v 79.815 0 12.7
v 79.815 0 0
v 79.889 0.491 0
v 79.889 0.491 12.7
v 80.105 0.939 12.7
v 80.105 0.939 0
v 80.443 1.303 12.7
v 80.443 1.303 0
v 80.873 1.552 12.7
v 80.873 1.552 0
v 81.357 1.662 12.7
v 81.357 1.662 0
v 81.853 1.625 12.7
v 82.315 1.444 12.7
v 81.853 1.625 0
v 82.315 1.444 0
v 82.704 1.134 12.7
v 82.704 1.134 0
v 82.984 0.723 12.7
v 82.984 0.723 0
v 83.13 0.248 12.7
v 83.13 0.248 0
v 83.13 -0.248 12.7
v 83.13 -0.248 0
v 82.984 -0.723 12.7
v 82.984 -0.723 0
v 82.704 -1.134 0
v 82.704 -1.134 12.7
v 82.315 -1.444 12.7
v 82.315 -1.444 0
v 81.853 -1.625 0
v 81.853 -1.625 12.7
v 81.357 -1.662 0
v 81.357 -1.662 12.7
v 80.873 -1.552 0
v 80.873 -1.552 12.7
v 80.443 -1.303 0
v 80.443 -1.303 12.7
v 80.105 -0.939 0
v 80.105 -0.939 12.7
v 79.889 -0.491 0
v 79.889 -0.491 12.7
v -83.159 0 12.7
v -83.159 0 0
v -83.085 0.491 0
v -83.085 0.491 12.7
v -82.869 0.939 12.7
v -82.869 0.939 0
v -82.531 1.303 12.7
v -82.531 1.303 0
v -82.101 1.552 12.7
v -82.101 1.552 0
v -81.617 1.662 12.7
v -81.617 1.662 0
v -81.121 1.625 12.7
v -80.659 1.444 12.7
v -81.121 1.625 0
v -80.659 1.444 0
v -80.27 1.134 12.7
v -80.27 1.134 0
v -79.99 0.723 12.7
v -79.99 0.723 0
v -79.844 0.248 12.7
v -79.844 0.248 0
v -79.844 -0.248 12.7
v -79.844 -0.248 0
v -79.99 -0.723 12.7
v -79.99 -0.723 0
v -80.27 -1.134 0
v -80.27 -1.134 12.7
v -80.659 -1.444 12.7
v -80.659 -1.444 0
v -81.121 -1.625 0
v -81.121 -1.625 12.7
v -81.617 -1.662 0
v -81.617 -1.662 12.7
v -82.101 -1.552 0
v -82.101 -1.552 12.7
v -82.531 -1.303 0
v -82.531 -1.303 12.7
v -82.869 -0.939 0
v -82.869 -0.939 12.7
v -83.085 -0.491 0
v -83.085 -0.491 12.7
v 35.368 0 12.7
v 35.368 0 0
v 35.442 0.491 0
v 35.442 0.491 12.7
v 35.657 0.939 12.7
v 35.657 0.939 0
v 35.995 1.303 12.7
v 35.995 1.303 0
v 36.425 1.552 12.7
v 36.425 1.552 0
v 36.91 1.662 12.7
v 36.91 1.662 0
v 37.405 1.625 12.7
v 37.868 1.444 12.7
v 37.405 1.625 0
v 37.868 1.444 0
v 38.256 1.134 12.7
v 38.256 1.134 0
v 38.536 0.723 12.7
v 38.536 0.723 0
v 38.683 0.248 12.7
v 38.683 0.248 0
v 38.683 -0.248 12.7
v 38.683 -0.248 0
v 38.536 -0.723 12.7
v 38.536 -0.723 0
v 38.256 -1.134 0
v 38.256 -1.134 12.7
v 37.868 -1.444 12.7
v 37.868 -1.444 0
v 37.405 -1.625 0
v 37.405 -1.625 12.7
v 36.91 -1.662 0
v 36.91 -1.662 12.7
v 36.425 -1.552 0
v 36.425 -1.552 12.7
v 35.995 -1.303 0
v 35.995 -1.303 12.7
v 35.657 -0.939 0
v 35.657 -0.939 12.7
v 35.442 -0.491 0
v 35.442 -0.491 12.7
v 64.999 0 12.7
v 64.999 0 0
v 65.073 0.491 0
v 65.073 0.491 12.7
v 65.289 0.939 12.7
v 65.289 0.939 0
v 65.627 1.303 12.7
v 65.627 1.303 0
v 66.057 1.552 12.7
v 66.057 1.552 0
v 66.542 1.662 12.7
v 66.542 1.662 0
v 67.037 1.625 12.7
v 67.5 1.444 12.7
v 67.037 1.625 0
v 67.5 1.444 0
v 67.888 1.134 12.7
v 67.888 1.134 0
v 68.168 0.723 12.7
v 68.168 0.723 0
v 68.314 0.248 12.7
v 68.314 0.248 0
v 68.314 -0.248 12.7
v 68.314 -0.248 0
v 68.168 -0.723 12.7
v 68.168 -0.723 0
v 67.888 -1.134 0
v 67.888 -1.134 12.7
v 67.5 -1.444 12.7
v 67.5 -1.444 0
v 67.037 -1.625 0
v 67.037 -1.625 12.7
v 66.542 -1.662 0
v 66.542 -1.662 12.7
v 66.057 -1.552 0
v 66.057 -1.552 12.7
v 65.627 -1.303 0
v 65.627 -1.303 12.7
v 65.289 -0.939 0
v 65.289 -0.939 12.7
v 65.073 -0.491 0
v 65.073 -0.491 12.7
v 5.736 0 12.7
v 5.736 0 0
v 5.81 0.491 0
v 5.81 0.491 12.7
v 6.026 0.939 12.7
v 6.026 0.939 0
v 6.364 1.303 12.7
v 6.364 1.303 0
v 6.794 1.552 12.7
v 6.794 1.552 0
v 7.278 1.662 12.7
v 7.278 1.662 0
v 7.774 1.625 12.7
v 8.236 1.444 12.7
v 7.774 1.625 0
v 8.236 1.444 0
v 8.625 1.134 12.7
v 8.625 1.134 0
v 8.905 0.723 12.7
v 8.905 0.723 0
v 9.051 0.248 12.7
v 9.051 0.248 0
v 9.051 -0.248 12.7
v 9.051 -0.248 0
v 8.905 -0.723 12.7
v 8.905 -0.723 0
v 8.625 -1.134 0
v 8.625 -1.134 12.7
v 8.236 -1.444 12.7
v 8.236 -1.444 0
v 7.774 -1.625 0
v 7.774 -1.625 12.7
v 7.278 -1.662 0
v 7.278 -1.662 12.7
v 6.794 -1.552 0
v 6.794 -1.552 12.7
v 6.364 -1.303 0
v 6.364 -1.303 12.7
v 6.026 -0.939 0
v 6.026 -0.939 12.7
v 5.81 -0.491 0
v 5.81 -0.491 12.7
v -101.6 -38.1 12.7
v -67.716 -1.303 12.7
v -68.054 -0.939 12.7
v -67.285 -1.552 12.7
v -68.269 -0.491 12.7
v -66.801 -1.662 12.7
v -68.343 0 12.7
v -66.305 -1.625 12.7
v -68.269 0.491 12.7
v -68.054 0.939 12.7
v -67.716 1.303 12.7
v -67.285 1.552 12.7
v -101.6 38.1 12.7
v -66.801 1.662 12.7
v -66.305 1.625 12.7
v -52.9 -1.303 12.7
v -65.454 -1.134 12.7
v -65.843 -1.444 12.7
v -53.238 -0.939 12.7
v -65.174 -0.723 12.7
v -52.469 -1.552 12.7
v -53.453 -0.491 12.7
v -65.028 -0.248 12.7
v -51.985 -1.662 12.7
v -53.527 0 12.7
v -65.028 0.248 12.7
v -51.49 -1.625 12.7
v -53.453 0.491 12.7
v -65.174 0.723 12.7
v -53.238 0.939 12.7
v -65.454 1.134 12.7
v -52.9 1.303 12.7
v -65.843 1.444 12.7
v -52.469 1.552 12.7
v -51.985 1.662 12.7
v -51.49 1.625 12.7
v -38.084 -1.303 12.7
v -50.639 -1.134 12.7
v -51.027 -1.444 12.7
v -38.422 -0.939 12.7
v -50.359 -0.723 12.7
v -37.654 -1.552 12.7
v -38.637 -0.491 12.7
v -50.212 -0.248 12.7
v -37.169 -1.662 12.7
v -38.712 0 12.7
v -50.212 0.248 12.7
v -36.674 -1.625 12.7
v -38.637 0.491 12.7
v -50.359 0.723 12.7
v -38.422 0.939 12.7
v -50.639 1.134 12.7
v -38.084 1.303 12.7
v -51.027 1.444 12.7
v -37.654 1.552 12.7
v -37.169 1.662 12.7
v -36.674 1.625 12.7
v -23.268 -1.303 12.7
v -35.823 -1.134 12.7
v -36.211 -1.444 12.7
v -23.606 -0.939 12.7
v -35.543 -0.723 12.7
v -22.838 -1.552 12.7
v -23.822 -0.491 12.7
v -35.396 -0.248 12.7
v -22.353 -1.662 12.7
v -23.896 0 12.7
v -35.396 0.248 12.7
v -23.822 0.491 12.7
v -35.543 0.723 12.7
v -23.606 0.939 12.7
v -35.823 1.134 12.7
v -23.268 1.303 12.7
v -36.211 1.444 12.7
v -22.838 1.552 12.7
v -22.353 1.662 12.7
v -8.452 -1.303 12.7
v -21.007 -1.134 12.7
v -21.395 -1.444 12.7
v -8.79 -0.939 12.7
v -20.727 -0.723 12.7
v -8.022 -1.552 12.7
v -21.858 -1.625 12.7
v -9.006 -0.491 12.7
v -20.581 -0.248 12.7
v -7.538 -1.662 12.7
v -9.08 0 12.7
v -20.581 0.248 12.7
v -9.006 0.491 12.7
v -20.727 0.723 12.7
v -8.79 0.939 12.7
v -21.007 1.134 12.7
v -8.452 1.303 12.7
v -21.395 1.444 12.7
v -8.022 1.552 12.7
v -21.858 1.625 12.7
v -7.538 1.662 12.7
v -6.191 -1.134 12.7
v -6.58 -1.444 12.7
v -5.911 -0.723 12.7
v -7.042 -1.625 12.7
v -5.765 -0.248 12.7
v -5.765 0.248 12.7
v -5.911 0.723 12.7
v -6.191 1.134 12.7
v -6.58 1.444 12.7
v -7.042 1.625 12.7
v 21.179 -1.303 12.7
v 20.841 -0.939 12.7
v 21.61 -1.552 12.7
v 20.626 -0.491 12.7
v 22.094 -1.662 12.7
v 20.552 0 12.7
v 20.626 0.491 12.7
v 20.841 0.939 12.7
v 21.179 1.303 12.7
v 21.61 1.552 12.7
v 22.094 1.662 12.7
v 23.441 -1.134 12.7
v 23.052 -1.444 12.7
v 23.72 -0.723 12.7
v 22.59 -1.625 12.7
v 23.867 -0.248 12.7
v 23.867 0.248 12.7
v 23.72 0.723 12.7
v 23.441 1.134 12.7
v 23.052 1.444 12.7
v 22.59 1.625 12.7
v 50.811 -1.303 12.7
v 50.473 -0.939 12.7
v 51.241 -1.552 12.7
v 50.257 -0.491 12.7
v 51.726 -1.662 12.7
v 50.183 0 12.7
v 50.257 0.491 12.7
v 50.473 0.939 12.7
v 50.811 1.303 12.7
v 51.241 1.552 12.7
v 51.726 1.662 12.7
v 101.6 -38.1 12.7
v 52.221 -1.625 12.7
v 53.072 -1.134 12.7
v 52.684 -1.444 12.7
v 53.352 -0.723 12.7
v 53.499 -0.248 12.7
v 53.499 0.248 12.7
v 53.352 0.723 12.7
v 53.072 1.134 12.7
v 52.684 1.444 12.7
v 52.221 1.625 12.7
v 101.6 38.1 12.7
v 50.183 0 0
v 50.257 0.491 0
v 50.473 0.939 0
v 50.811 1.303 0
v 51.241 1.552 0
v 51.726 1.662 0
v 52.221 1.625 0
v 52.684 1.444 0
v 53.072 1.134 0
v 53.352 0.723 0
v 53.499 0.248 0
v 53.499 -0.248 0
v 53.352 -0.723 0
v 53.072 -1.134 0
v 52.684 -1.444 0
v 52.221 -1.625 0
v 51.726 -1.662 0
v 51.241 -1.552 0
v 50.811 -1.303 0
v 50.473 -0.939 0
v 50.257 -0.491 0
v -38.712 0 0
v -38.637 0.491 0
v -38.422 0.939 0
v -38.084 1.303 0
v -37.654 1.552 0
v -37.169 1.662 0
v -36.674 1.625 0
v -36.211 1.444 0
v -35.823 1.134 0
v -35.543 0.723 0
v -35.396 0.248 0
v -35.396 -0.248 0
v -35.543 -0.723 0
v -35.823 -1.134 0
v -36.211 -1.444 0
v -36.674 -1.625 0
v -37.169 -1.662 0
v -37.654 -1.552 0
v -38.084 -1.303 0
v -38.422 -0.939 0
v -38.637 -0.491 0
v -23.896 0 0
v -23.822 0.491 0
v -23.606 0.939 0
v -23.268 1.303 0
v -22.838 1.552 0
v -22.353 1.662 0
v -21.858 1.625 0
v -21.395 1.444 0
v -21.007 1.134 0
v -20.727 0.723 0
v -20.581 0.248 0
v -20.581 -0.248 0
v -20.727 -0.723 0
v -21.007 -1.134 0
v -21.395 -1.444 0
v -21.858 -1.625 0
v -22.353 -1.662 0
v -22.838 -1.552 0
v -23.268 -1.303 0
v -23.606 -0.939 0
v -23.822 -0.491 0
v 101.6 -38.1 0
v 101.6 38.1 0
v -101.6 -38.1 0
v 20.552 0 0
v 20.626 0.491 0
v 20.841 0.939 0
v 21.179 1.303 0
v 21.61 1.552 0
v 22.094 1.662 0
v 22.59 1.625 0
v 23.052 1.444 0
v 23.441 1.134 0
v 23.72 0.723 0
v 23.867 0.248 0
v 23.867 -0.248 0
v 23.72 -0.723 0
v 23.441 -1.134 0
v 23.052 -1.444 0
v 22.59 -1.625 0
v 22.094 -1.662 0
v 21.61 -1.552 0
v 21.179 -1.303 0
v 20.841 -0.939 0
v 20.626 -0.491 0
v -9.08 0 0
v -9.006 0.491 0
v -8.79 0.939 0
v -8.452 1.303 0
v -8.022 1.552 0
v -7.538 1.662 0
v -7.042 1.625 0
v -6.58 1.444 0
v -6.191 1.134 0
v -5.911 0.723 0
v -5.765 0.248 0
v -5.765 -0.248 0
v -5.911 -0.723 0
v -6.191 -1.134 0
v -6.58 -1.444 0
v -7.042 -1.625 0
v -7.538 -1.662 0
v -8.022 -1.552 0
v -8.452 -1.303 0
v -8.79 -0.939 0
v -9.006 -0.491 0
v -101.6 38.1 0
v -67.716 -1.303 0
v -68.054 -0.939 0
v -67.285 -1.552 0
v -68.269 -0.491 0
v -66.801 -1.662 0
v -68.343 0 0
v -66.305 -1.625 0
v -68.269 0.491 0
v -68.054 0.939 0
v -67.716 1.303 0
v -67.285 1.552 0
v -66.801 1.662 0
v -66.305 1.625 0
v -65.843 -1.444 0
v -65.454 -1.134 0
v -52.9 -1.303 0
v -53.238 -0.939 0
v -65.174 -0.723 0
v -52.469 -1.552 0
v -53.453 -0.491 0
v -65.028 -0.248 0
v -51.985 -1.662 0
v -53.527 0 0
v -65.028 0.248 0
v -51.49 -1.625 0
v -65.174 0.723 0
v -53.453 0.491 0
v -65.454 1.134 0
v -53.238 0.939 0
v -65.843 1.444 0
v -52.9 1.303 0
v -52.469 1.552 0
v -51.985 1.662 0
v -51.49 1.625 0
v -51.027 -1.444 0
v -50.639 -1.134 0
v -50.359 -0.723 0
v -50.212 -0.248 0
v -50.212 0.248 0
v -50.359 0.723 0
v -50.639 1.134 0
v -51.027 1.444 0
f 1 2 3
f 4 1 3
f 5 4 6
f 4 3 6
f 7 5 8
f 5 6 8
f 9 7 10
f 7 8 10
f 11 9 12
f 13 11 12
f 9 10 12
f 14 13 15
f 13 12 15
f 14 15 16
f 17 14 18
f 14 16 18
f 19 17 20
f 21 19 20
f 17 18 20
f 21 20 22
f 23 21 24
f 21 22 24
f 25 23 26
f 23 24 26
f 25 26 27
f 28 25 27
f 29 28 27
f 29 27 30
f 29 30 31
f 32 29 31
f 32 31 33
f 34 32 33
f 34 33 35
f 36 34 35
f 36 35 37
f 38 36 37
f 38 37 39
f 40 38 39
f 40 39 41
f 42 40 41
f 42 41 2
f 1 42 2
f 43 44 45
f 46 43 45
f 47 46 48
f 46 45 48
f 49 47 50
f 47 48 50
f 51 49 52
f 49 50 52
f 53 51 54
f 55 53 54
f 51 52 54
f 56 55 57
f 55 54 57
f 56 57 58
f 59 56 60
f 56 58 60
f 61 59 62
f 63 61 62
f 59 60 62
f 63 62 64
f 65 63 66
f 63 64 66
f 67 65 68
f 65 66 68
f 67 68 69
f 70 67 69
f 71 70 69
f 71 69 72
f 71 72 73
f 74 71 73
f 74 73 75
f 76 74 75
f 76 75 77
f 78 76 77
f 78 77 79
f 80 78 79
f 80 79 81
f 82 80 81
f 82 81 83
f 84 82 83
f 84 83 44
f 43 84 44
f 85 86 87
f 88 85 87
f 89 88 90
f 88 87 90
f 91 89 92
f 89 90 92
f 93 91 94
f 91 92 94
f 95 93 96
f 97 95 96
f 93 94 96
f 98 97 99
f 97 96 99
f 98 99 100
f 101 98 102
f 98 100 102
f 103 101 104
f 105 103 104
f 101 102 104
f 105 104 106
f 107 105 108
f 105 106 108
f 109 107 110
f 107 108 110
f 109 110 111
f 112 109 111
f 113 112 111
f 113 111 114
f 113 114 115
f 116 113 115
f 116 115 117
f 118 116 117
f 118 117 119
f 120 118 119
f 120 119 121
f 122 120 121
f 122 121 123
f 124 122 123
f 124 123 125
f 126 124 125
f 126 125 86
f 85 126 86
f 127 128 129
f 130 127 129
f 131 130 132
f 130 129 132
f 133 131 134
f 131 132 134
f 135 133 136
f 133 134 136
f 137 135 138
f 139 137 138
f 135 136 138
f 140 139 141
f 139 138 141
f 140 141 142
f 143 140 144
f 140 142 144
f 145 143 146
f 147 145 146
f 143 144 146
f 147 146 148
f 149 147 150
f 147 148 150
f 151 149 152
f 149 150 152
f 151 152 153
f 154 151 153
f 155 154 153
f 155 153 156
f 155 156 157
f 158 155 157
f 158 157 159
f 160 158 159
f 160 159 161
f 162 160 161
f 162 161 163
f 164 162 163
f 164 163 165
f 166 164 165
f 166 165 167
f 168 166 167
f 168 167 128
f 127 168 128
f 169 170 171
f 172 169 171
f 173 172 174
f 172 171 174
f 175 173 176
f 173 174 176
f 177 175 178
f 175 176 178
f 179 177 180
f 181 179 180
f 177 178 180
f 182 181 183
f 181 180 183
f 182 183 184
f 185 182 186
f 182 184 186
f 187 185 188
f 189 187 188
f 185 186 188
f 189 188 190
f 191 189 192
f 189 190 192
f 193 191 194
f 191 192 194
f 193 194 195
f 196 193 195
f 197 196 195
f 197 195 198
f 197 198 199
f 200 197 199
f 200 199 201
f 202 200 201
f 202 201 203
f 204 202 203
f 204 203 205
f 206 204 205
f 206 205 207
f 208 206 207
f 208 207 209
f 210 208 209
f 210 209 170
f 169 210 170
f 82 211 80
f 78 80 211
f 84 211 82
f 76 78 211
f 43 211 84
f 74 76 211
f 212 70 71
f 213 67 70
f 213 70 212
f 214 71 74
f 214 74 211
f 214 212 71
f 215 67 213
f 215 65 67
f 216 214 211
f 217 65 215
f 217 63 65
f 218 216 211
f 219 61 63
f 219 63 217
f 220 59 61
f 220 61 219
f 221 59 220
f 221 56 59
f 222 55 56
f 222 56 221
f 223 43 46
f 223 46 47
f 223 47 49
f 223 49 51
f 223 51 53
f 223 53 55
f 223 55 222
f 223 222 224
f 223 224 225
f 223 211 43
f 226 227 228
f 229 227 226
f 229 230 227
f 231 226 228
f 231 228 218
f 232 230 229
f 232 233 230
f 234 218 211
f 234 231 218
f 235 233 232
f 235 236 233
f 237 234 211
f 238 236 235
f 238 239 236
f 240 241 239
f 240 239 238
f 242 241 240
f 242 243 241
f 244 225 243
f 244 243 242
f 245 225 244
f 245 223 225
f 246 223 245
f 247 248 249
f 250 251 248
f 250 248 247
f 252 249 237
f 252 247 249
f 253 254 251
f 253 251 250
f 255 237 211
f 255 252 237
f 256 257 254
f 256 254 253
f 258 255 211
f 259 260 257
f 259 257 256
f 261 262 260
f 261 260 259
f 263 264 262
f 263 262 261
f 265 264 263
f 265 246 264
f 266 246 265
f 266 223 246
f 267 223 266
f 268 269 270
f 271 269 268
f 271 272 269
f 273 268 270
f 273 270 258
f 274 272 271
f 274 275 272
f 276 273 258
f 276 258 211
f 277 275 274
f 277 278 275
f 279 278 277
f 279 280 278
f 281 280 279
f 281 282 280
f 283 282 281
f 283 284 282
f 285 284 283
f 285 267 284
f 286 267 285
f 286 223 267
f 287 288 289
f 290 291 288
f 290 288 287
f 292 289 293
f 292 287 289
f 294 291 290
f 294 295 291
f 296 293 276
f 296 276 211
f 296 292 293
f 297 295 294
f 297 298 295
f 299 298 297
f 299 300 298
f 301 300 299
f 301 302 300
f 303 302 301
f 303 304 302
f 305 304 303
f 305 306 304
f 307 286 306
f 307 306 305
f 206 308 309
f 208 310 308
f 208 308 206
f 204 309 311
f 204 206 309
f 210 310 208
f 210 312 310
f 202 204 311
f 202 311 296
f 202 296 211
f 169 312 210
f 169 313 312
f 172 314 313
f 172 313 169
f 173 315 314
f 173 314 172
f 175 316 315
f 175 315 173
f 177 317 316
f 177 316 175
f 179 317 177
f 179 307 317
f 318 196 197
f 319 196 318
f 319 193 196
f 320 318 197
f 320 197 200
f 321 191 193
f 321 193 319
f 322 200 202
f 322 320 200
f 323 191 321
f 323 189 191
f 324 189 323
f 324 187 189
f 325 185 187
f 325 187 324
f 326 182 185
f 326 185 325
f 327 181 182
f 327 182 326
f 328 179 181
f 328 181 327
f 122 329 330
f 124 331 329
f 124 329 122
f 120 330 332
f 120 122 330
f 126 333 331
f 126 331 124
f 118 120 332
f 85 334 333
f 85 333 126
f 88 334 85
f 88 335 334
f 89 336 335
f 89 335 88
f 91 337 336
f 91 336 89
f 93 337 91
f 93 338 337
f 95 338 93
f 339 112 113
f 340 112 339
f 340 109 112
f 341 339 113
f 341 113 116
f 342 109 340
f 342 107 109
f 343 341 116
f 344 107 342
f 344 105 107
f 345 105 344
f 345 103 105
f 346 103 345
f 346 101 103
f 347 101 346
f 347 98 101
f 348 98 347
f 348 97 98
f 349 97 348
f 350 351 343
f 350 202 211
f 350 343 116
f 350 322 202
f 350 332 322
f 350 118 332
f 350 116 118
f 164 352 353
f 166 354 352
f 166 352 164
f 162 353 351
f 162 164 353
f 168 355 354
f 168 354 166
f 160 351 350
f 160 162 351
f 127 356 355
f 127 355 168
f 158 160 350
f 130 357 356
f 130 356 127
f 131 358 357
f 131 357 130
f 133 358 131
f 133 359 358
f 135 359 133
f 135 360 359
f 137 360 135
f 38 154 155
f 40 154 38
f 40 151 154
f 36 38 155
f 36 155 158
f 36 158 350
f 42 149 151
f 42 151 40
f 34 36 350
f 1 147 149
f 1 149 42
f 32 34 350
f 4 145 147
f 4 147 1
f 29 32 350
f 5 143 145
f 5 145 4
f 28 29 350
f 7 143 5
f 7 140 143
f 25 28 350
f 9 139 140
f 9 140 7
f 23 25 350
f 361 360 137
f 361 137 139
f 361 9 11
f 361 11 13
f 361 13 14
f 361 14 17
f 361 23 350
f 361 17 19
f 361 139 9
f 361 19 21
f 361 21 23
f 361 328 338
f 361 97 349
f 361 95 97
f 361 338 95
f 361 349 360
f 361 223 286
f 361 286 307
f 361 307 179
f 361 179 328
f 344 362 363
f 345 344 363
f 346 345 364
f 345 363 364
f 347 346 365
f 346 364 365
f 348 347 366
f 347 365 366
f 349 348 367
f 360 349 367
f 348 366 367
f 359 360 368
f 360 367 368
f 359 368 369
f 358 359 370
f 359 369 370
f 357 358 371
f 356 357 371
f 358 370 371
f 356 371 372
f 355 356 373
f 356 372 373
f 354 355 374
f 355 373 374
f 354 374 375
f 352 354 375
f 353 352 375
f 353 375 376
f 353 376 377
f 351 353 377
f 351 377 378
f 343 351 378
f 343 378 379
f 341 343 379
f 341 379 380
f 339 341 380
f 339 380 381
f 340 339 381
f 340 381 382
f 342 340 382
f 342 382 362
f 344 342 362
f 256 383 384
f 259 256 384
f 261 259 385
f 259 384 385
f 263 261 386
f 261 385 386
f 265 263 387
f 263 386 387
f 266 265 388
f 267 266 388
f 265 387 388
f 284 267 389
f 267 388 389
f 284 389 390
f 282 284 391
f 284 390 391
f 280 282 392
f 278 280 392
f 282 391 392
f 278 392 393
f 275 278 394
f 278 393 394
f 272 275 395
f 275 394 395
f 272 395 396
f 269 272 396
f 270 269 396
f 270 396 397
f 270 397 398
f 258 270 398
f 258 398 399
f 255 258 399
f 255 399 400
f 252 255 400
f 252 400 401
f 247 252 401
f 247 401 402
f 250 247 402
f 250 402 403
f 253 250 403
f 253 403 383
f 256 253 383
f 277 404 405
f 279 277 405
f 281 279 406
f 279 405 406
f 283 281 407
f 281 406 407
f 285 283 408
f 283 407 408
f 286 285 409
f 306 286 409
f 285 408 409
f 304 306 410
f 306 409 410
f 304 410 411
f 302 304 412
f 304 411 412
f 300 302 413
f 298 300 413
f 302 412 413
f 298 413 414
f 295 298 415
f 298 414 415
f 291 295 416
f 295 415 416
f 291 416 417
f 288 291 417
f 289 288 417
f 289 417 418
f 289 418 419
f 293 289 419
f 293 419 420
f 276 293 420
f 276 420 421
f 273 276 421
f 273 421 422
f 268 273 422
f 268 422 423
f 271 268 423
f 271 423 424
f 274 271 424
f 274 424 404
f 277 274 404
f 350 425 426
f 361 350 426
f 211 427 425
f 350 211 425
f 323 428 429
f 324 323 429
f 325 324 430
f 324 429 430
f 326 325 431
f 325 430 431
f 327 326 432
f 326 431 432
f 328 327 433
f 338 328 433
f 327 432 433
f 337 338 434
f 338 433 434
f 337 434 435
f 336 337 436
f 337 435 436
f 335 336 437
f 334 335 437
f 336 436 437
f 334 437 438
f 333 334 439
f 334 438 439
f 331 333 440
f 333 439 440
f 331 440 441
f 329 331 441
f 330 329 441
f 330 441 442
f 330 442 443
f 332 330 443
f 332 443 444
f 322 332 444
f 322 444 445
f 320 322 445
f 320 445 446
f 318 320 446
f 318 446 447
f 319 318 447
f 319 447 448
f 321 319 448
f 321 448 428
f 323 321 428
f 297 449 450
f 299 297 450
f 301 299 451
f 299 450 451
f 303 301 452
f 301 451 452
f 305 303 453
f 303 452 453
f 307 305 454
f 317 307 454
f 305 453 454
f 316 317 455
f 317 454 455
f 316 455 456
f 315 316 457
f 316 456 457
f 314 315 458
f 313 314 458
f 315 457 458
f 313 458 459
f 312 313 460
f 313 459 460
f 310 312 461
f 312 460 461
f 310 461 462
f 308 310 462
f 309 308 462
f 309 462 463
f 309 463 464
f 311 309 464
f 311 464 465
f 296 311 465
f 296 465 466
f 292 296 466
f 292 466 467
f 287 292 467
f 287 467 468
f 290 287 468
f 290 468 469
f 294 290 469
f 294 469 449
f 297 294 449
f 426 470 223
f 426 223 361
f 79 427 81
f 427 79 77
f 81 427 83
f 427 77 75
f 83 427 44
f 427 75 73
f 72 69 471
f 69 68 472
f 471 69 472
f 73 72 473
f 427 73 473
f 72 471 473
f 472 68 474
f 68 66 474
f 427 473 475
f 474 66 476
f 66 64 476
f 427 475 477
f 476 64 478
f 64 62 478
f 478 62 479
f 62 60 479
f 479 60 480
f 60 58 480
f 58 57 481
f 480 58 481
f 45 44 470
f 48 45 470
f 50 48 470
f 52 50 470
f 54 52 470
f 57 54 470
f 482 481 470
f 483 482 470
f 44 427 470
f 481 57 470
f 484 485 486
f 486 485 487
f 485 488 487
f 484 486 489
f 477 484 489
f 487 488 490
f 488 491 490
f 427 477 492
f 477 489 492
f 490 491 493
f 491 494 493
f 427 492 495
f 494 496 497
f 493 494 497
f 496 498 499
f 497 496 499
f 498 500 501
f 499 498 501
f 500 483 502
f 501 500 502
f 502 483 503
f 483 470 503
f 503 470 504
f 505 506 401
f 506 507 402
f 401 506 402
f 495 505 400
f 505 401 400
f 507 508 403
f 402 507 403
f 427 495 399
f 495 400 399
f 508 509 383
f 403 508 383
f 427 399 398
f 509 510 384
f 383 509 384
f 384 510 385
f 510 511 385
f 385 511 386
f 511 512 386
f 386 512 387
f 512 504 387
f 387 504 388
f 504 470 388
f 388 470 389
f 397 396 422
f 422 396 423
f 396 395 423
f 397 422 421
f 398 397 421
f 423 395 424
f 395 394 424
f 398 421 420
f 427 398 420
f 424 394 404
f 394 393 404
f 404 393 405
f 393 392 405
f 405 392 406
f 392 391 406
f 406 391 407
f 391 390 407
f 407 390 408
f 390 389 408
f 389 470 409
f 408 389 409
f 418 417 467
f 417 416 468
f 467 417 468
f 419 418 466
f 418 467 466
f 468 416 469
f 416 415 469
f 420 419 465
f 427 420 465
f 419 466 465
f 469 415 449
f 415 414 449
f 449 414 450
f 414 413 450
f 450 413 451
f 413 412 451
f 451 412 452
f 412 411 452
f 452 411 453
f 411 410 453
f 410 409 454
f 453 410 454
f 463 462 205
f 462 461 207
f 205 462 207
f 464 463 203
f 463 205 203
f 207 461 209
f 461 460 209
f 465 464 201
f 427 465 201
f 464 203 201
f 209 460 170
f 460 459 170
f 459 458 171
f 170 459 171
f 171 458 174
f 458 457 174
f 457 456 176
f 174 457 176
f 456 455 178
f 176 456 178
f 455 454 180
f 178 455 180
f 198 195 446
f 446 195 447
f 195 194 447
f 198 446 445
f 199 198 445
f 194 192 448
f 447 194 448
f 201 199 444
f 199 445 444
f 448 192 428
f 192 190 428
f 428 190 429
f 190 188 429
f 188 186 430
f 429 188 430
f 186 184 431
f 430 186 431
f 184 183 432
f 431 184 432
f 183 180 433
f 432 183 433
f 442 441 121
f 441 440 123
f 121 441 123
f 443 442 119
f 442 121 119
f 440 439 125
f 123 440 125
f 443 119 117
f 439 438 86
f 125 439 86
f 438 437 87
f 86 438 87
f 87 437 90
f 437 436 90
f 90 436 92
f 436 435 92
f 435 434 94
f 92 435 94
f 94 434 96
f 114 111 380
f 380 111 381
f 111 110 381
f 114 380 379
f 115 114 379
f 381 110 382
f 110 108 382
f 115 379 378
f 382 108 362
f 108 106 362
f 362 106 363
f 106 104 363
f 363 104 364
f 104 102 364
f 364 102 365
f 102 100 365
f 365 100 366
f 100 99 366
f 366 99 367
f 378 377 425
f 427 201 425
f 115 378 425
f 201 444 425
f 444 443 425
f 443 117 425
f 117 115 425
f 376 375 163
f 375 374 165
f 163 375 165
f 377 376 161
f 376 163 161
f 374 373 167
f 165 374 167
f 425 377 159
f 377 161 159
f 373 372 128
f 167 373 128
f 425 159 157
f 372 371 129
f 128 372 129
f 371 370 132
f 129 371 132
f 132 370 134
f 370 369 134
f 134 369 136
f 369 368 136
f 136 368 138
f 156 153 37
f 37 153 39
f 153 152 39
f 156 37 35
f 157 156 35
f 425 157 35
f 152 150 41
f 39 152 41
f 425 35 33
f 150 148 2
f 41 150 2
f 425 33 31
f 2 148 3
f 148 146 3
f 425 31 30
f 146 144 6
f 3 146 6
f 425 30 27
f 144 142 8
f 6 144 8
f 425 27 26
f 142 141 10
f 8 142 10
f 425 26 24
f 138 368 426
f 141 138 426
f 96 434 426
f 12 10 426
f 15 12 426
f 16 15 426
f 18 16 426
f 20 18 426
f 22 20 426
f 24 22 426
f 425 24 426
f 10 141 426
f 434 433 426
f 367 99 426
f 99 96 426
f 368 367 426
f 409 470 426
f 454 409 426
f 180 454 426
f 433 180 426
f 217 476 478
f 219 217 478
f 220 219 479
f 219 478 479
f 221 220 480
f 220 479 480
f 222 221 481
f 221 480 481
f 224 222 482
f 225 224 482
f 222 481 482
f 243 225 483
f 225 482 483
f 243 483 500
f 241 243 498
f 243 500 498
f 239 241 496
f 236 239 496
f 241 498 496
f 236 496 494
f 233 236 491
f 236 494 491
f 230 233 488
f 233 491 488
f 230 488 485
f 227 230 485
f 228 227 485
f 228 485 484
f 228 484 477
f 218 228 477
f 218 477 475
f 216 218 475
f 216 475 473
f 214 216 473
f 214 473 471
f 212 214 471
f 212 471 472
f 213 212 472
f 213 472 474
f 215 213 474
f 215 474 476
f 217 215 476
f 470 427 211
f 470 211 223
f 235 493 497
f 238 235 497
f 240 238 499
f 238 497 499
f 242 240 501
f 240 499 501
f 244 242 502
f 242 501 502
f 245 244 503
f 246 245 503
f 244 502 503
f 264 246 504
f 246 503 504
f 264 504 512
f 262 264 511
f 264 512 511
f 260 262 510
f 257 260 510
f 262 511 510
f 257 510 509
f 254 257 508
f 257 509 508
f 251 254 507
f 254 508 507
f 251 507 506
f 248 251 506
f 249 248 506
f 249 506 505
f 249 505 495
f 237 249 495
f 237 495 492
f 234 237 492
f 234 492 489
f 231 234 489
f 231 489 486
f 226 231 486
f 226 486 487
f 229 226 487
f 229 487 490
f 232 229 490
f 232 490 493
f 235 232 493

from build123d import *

# Parameters (mm, degrees)
ESQUISSE1_W             = 203.2
ESQUISSE1_H             = 76.2
BOSS_EXTRU_1_DEPTH      = 12.7
ESQUISSE2_R             = 1.666875
ENL_V_MAT_EXTRU_1_DEPTH = 110.249530891


with BuildPart() as part:
    # Esquisse1 → Boss.-Extru.1 (new body)
    with BuildSketch(Plane.XY):
        Rectangle(ESQUISSE1_W, ESQUISSE1_H)
    extrude(amount=BOSS_EXTRU_1_DEPTH)

    # Esquisse2 → Enlèv. mat.-Extru.1 (cut, through all)
    with BuildSketch(Plane(origin=(0, 0, 0), x_dir=(-1, 0, 0), z_dir=(0, 0, -1))):
        with Locations((81.49209, 0)):
            Circle(ESQUISSE2_R)
        with Locations((66.67627, 0)):
            Circle(ESQUISSE2_R)
        with Locations((51.86045, 0)):
            Circle(ESQUISSE2_R)
        with Locations((37.04463, 0)):
            Circle(ESQUISSE2_R)
        with Locations((22.22881, 0)):
            Circle(ESQUISSE2_R)
        with Locations((7.41299, 0)):
            Circle(ESQUISSE2_R)
        with Locations((-7.40283, 0)):
            Circle(ESQUISSE2_R)
        with Locations((-22.21865, 0)):
            Circle(ESQUISSE2_R)
        with Locations((-37.03447, 0)):
            Circle(ESQUISSE2_R)
        with Locations((-51.85029, 0)):
            Circle(ESQUISSE2_R)
        with Locations((-66.66611, 0)):
            Circle(ESQUISSE2_R)
        with Locations((-81.48193, 0)):
            Circle(ESQUISSE2_R)
    extrude(amount=-ENL_V_MAT_EXTRU_1_DEPTH, mode=Mode.SUBTRACT)


solid = part.part
